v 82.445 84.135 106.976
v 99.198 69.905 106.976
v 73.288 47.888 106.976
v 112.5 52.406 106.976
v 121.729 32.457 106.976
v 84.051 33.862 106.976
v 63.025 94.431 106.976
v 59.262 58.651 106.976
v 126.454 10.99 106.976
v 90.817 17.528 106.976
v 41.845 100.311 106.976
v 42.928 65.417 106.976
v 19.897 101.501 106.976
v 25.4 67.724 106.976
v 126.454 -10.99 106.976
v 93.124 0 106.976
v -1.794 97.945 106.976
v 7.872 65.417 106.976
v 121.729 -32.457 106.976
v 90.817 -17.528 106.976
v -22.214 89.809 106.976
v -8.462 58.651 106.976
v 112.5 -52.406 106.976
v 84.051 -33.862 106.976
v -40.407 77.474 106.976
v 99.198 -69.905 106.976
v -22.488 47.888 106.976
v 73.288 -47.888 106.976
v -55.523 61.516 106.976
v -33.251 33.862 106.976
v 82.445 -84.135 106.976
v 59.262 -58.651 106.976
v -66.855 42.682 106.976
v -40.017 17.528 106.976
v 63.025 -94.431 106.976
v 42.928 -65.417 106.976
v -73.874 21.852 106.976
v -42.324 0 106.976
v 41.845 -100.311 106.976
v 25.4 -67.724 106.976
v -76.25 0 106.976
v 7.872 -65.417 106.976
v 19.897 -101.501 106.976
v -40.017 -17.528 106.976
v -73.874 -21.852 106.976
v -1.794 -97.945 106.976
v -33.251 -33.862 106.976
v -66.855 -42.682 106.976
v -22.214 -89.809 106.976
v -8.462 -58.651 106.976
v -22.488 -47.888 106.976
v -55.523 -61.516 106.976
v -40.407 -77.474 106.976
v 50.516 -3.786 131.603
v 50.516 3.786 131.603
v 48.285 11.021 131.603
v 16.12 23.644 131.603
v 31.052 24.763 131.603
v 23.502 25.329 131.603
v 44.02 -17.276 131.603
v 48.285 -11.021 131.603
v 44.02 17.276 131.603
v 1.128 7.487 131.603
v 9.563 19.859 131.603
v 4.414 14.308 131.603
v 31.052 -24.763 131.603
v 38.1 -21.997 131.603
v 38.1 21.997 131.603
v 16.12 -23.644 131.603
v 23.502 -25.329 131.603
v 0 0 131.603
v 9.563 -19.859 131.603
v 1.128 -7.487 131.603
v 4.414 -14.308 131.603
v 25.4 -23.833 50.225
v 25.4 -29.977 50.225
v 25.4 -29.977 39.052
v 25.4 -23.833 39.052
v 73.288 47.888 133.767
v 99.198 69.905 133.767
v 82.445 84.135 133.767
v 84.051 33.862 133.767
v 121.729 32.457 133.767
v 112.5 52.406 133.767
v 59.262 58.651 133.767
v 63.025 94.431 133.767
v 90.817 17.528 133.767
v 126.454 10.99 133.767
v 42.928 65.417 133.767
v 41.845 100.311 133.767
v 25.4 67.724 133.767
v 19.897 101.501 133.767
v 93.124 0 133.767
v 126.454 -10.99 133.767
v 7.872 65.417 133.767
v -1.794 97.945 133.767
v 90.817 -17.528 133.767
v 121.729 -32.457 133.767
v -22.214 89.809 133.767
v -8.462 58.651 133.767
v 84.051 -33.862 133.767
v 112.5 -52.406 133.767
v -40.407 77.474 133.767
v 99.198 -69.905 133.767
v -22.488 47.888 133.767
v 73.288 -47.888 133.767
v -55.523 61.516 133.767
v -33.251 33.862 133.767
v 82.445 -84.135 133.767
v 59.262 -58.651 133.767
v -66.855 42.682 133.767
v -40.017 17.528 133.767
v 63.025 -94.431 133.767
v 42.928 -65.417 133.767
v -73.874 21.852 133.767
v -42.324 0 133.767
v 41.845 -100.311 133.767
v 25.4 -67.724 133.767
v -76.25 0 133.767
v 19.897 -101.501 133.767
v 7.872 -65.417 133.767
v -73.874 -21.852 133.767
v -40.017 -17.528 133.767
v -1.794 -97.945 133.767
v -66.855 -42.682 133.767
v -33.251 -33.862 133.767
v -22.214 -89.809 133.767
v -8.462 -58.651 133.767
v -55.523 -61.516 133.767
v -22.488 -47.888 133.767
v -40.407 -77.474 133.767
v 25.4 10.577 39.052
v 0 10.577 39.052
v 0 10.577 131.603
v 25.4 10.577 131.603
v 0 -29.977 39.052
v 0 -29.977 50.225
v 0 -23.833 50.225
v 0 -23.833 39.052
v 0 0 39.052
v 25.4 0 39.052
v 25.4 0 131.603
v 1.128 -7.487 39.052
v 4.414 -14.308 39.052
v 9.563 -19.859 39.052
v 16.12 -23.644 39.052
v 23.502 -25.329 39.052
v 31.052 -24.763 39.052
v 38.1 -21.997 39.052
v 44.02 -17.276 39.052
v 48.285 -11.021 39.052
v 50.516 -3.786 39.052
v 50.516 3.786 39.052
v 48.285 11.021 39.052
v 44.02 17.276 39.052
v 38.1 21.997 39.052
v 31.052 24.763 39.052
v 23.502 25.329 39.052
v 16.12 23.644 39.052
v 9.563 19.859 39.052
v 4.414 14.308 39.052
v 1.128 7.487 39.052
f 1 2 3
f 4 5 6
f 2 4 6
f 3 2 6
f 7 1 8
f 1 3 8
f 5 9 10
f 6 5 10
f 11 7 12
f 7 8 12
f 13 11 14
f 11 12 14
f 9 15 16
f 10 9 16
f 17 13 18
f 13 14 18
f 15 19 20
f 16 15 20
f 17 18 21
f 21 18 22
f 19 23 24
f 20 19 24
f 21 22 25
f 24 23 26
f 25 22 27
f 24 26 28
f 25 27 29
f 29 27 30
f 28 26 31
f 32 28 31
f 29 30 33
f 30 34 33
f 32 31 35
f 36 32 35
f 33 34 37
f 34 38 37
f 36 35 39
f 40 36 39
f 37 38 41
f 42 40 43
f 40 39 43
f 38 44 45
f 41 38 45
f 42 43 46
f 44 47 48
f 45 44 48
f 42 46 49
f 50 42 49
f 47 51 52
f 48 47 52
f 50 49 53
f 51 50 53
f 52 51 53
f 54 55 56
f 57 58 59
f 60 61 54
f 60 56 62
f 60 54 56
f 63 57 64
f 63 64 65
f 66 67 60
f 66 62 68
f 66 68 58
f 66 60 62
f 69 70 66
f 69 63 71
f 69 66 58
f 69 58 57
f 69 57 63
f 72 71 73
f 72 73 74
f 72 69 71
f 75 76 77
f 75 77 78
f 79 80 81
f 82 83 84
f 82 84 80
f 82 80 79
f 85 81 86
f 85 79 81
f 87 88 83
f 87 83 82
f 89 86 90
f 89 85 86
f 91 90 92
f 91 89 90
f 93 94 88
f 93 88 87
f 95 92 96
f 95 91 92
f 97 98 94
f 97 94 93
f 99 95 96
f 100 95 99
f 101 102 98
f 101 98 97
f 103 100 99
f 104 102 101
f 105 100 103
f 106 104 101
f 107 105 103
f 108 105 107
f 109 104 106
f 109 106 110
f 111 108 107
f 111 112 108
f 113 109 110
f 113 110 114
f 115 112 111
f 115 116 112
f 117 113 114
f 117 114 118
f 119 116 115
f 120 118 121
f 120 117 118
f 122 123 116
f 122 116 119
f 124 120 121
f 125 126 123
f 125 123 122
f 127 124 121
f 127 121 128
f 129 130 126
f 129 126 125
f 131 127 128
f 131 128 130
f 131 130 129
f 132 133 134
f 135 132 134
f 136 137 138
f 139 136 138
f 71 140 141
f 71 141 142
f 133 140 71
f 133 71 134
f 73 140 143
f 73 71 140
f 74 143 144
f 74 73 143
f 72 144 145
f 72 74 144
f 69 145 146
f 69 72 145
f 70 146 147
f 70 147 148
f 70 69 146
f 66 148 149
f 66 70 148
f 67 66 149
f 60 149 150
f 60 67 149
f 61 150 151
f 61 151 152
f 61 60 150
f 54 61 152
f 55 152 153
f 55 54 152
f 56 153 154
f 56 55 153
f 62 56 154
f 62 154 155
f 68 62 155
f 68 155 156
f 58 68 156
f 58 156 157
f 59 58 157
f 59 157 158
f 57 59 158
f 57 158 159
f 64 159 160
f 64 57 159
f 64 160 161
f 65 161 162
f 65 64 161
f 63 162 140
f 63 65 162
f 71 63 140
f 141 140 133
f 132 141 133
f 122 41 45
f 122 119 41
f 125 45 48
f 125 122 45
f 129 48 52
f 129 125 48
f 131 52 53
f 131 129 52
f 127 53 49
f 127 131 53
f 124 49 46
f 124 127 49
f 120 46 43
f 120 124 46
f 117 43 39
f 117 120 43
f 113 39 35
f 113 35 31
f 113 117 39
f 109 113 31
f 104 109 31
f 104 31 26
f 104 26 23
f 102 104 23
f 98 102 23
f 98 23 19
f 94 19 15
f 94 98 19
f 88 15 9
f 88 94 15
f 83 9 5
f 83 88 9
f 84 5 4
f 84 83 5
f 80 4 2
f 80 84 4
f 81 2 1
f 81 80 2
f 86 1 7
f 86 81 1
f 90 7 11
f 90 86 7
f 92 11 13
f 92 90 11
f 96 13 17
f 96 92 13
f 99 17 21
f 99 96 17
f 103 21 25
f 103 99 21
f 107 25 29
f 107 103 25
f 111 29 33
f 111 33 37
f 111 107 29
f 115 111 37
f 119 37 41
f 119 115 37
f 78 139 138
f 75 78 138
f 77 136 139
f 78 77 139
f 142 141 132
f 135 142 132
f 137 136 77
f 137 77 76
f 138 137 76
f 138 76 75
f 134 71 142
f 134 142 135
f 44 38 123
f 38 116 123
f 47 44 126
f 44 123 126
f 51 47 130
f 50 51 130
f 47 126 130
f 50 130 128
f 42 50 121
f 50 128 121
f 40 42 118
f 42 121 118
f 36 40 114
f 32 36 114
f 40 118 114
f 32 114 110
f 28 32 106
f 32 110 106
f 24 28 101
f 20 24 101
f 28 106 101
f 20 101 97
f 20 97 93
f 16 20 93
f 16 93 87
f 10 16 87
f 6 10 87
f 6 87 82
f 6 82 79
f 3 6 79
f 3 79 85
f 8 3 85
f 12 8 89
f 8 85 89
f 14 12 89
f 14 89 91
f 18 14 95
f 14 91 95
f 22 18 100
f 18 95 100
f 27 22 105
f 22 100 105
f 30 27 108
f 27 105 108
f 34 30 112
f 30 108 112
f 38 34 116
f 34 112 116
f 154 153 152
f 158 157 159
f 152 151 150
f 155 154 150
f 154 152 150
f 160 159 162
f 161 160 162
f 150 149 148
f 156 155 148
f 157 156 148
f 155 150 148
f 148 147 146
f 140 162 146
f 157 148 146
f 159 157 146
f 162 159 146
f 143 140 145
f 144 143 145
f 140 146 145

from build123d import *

# Parameters (mm, degrees)
F0_W      = 6.1436966062
F0_H      = 11.1728049815
F1_DEPTH  = 25.4
F0_W_2    = 10.5770677328
F0_H_2    = 92.550970614
F4_W      = 33.9257717133
F4_H      = 26.7906486988
F1_FACE_W = 25.4
F1_FACE_H = 92.550970614


# Not quite as in the source:
# - the program builds the solid bodies; features that only make, move or delete a surface that nothing else refers to are left out


with BuildPart() as f1:
    # F0 (on Right) → F1 (new body)
    with BuildSketch(Plane.YZ):
        with Locations((-26.9047878683, 44.6388516575)):
            Rectangle(F0_W, F0_H)
    extrude(amount=F1_DEPTH)


with BuildPart() as f1b:
    # F0 (on Right) → F1, piece 2 (new body)
    with BuildSketch(Plane.YZ):
        with Locations((5.2885338664, 85.3279344738)):
            Rectangle(F0_W_2, F0_H_2)
    extrude(amount=F1_DEPTH)


with BuildPart() as f5:
    # F4 (on Front) → F5 (revolve)
    with BuildSketch(Plane.XZ):
        with Locations((-59.2873692513, 120.3713193536)):
            Rectangle(F4_W, F4_H)
    revolve(axis=Axis((25.4, 0, 85.3279344738), (0, 0, 1)))


with BuildPart() as f5b:
    # F1_face (on face) → F5, piece 2 (revolve)
    with BuildSketch(Plane(origin=(12.7, 0, 85.3279344738), x_dir=(1, 0, 0), z_dir=(0, -1, 0))):
        Rectangle(F1_FACE_W, F1_FACE_H)
    revolve(axis=Axis((25.4, 0, 85.3279344738), (0, 0, 1)))


solid = Compound([f1.part, f1b.part, f5.part, f5b.part])
